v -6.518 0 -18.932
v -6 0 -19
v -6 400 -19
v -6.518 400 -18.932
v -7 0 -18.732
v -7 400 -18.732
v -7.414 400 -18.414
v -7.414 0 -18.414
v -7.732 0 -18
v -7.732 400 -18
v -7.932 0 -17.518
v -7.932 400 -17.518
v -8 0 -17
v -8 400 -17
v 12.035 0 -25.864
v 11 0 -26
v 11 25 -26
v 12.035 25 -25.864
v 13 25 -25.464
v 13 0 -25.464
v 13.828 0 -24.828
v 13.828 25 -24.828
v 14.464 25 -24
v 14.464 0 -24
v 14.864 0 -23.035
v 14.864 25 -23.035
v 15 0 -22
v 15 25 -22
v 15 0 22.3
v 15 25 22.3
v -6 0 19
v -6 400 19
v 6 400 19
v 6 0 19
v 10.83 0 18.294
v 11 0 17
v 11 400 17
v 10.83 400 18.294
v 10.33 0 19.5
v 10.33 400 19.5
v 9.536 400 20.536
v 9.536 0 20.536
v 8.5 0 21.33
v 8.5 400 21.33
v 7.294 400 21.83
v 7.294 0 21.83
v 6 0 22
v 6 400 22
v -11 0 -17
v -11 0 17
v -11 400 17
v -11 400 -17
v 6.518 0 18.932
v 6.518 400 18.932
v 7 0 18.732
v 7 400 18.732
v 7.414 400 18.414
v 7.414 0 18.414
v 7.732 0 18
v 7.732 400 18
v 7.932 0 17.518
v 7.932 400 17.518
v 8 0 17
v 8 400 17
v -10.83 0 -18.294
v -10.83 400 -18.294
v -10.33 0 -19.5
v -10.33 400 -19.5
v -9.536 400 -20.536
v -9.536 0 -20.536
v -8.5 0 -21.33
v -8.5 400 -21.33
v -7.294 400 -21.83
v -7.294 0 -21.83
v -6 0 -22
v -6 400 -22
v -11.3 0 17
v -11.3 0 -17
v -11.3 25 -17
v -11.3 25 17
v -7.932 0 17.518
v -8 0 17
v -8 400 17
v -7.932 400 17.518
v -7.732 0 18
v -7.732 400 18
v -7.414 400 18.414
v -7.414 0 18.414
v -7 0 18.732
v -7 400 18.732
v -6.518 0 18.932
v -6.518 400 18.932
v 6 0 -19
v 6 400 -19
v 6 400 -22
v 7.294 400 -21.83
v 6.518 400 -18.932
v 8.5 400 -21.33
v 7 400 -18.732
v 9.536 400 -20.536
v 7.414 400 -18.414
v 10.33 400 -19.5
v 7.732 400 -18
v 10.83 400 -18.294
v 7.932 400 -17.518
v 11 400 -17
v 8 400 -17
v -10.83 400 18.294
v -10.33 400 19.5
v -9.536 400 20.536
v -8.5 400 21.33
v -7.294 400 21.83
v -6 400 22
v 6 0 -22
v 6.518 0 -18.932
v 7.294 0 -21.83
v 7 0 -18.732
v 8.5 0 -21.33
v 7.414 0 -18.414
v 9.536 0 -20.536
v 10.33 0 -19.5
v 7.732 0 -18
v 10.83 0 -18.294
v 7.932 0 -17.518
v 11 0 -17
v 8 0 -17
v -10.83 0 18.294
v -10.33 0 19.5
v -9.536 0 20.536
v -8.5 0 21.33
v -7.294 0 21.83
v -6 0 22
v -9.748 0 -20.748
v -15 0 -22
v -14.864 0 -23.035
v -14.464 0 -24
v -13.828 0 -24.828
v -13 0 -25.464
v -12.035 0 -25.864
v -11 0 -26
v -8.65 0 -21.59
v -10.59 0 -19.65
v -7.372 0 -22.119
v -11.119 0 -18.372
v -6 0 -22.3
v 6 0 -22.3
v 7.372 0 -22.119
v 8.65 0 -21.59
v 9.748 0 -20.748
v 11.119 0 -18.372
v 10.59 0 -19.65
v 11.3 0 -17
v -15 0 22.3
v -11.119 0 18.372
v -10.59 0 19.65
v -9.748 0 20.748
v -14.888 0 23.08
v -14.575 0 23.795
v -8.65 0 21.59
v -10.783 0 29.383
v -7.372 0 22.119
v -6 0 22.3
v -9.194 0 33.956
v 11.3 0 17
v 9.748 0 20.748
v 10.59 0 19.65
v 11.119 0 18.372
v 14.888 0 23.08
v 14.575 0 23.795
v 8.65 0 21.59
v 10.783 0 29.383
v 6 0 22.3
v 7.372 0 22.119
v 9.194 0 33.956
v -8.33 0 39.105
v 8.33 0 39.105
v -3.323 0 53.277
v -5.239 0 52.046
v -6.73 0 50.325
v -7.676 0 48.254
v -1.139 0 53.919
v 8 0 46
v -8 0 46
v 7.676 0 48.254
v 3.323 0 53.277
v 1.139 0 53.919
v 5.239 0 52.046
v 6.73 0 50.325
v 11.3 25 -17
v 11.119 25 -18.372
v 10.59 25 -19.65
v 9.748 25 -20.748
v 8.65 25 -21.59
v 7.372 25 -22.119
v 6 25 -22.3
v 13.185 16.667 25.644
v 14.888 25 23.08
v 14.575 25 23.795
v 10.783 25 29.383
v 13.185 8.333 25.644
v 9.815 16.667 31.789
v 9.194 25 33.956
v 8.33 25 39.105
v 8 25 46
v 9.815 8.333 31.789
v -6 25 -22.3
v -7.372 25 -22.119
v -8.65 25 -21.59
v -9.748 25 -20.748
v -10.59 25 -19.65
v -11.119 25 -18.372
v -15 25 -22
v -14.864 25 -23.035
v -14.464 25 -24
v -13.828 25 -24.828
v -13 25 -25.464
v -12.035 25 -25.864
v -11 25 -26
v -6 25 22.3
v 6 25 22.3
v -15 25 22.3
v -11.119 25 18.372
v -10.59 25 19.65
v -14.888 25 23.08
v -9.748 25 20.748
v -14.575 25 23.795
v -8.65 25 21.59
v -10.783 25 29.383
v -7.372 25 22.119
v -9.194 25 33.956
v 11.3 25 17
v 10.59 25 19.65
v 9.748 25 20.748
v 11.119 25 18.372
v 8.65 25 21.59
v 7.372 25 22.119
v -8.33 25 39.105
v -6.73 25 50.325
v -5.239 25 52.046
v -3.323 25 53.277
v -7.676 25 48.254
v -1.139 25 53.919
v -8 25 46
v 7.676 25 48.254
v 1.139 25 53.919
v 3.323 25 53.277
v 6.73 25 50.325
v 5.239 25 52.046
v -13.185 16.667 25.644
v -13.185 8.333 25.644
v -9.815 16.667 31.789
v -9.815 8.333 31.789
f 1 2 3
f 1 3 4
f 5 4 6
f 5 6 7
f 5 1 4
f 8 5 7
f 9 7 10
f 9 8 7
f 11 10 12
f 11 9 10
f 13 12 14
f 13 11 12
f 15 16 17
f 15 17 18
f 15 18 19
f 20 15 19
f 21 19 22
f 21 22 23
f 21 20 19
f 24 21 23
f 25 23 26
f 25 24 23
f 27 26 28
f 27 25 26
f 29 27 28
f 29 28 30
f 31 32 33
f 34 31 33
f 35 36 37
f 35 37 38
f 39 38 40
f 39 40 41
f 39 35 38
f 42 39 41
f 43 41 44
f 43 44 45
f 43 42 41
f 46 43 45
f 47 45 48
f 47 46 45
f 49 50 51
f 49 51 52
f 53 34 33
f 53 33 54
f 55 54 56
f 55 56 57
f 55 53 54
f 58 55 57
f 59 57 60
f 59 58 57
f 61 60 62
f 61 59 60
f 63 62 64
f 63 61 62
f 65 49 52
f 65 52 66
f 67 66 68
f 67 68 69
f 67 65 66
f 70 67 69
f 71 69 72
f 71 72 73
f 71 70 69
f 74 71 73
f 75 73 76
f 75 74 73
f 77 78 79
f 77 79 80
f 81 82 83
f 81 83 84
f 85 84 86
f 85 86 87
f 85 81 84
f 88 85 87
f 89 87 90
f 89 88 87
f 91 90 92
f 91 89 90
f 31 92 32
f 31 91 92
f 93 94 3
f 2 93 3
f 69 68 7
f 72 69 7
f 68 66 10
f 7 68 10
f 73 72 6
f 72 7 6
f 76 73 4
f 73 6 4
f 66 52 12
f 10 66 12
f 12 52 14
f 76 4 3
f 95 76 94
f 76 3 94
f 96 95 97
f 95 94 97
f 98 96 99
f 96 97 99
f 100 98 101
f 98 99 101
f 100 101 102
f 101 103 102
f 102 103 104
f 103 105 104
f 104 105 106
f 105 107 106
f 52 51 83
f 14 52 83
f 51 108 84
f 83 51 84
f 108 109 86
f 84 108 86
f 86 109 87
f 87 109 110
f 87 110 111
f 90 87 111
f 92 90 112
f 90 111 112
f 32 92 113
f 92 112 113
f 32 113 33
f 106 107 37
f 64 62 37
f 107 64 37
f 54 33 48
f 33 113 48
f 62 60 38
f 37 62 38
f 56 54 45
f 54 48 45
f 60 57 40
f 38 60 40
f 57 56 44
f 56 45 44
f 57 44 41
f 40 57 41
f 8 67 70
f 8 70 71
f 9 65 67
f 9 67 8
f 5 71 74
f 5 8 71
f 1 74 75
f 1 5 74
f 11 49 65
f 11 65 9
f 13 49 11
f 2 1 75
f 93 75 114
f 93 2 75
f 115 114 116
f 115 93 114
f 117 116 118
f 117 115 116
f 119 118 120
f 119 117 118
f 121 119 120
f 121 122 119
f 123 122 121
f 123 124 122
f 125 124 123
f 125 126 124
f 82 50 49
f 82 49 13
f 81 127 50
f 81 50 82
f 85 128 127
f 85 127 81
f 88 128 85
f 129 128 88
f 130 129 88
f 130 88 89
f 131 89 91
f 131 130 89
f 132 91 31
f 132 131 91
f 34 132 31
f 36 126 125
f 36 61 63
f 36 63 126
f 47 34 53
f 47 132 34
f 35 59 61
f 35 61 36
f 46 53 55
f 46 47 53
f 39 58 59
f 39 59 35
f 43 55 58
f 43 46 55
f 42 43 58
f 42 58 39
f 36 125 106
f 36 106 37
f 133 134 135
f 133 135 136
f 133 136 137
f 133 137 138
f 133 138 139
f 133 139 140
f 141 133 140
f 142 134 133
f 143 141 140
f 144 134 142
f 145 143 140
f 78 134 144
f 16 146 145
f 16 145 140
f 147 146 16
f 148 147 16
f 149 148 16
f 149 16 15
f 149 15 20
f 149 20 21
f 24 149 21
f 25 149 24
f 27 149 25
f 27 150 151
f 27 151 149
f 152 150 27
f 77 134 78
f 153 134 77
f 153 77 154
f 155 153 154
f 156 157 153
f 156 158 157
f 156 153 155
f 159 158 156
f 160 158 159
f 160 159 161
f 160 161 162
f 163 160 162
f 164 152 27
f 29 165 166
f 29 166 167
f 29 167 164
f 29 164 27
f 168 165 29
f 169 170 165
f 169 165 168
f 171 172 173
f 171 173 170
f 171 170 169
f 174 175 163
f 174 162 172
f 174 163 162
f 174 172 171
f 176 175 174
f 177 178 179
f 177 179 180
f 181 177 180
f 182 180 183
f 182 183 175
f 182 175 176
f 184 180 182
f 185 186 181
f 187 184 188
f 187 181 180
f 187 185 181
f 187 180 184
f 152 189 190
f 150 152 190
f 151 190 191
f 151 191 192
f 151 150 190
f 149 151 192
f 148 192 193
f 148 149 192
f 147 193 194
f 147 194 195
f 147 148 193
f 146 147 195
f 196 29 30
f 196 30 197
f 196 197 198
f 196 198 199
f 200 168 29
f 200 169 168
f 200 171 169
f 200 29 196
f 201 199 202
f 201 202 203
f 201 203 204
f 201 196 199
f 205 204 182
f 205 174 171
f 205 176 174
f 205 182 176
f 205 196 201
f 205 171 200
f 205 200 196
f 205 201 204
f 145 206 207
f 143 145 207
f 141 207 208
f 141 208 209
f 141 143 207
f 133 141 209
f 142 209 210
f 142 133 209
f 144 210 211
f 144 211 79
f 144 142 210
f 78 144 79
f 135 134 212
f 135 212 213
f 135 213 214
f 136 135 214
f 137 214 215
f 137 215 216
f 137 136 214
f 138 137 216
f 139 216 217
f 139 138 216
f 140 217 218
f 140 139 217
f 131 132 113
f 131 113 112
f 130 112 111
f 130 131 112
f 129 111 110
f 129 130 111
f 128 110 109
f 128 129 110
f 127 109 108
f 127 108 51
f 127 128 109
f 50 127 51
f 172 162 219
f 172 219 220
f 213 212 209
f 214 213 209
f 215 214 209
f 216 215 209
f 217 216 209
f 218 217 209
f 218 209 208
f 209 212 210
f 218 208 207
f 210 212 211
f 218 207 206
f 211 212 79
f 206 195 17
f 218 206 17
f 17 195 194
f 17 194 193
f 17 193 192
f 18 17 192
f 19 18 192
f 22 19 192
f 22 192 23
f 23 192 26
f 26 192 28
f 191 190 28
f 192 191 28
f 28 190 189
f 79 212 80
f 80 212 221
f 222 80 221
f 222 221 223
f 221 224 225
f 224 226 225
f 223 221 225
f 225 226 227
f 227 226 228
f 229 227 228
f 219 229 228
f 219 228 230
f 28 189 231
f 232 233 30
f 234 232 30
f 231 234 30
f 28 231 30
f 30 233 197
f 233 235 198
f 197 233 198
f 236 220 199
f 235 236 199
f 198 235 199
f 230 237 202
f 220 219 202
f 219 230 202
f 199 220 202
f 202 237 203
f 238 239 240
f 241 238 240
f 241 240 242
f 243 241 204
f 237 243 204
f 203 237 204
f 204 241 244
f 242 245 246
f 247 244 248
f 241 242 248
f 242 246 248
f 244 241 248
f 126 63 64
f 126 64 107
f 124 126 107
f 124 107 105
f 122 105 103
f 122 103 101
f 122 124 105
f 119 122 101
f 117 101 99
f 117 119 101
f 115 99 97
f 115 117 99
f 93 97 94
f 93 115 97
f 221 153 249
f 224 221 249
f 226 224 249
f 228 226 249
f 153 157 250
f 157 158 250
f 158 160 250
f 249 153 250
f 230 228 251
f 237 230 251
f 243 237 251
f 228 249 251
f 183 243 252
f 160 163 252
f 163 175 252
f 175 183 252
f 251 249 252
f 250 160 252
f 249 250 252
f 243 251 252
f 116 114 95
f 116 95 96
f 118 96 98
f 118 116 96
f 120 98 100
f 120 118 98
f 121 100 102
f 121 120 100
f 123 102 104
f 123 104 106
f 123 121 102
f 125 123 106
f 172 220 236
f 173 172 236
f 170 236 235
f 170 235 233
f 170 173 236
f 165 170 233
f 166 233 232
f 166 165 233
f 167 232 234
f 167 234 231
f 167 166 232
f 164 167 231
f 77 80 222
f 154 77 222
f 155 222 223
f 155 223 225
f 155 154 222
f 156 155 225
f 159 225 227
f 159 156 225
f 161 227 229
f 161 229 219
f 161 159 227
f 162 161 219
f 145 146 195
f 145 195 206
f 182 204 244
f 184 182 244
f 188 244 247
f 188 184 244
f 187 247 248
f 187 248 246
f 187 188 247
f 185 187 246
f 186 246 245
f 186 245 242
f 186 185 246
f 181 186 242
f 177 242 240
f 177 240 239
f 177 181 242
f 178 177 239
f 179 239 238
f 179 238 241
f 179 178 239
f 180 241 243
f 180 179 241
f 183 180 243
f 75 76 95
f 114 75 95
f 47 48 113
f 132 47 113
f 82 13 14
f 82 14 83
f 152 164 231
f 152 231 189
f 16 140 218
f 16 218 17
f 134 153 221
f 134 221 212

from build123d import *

# Parameters (mm, degrees)
F1_DEPTH = 400
F3_DEPTH = 25


with BuildPart() as f1:
    # F0 (on Front) → F1 (new body)
    with BuildSketch(Plane.XZ):
        with BuildLine():
            Line((6, 22), (-6, 22))
            ThreePointArc((-6, 22), (-9.535534, 20.535534), (-11, 17))
            Line((-11, 17), (-11, -17))
            ThreePointArc((-11, -17), (-9.535534, -20.535534), (-6, -22))
            Line((-6, -22), (6, -22))
            ThreePointArc((6, -22), (9.535534, -20.535534), (11, -17))
            Line((11, -17), (11, 17))
            ThreePointArc((11, 17), (9.535534, 20.535534), (6, 22))
        make_face()
        with BuildLine():
            ThreePointArc((-8, 17), (-7.414214, 18.414214), (-6, 19))
            Line((-6, 19), (6, 19))
            ThreePointArc((6, 19), (7.414214, 18.414214), (8, 17))
            Line((8, 17), (8, -17))
            ThreePointArc((8, -17), (7.414214, -18.414214), (6, -19))
            Line((6, -19), (-6, -19))
            ThreePointArc((-6, -19), (-7.414214, -18.414214), (-8, -17))
            Line((-8, -17), (-8, 17))
        make_face(mode=Mode.SUBTRACT)
    extrude(amount=-F1_DEPTH)


with BuildPart() as f3:
    # F2 (on Front) → F3 (new body)
    with BuildSketch(Plane.XZ):
        with BuildLine():
            ThreePointArc((-15, -22), (-13.828427, -24.828427), (-11, -26))
            Line((-11, -26), (11, -26))
            ThreePointArc((11, -26), (13.828427, -24.828427), (15, -22))
            Line((15, -22), (15, 22.3))
            add(Edge.make_bspline(
                [(15, 22.3), (15, 26), (8, 26), (8, 46)],
                knots=[0, 0, 0, 0, 24.712143, 24.712143, 24.712143, 24.712143], degree=3))
            ThreePointArc((8, 46), (0, 54), (-8, 46))
            add(Edge.make_bspline(
                [(-15, 22.3), (-15, 26), (-8, 26), (-8, 46)],
                knots=[0, 0, 0, 0, 24.712143, 24.712143, 24.712143, 24.712143], degree=3))
            Line((-15, 22.3), (-15, -22))
        make_face()
        with BuildLine():
            ThreePointArc((6, 22.3), (9.747666, 20.747666), (11.3, 17))
            Line((11.3, 17), (11.3, -17))
            ThreePointArc((11.3, -17), (9.747666, -20.747666), (6, -22.3))
            Line((6, -22.3), (-6, -22.3))
            ThreePointArc((-6, -22.3), (-9.747666, -20.747666), (-11.3, -17))
            Line((-11.3, -17), (-11.3, 17))
            ThreePointArc((-11.3, 17), (-9.747666, 20.747666), (-6, 22.3))
            Line((-6, 22.3), (6, 22.3))
        make_face(mode=Mode.SUBTRACT)
    extrude(amount=-F3_DEPTH)


solid = Compound([f1.part, f3.part])
